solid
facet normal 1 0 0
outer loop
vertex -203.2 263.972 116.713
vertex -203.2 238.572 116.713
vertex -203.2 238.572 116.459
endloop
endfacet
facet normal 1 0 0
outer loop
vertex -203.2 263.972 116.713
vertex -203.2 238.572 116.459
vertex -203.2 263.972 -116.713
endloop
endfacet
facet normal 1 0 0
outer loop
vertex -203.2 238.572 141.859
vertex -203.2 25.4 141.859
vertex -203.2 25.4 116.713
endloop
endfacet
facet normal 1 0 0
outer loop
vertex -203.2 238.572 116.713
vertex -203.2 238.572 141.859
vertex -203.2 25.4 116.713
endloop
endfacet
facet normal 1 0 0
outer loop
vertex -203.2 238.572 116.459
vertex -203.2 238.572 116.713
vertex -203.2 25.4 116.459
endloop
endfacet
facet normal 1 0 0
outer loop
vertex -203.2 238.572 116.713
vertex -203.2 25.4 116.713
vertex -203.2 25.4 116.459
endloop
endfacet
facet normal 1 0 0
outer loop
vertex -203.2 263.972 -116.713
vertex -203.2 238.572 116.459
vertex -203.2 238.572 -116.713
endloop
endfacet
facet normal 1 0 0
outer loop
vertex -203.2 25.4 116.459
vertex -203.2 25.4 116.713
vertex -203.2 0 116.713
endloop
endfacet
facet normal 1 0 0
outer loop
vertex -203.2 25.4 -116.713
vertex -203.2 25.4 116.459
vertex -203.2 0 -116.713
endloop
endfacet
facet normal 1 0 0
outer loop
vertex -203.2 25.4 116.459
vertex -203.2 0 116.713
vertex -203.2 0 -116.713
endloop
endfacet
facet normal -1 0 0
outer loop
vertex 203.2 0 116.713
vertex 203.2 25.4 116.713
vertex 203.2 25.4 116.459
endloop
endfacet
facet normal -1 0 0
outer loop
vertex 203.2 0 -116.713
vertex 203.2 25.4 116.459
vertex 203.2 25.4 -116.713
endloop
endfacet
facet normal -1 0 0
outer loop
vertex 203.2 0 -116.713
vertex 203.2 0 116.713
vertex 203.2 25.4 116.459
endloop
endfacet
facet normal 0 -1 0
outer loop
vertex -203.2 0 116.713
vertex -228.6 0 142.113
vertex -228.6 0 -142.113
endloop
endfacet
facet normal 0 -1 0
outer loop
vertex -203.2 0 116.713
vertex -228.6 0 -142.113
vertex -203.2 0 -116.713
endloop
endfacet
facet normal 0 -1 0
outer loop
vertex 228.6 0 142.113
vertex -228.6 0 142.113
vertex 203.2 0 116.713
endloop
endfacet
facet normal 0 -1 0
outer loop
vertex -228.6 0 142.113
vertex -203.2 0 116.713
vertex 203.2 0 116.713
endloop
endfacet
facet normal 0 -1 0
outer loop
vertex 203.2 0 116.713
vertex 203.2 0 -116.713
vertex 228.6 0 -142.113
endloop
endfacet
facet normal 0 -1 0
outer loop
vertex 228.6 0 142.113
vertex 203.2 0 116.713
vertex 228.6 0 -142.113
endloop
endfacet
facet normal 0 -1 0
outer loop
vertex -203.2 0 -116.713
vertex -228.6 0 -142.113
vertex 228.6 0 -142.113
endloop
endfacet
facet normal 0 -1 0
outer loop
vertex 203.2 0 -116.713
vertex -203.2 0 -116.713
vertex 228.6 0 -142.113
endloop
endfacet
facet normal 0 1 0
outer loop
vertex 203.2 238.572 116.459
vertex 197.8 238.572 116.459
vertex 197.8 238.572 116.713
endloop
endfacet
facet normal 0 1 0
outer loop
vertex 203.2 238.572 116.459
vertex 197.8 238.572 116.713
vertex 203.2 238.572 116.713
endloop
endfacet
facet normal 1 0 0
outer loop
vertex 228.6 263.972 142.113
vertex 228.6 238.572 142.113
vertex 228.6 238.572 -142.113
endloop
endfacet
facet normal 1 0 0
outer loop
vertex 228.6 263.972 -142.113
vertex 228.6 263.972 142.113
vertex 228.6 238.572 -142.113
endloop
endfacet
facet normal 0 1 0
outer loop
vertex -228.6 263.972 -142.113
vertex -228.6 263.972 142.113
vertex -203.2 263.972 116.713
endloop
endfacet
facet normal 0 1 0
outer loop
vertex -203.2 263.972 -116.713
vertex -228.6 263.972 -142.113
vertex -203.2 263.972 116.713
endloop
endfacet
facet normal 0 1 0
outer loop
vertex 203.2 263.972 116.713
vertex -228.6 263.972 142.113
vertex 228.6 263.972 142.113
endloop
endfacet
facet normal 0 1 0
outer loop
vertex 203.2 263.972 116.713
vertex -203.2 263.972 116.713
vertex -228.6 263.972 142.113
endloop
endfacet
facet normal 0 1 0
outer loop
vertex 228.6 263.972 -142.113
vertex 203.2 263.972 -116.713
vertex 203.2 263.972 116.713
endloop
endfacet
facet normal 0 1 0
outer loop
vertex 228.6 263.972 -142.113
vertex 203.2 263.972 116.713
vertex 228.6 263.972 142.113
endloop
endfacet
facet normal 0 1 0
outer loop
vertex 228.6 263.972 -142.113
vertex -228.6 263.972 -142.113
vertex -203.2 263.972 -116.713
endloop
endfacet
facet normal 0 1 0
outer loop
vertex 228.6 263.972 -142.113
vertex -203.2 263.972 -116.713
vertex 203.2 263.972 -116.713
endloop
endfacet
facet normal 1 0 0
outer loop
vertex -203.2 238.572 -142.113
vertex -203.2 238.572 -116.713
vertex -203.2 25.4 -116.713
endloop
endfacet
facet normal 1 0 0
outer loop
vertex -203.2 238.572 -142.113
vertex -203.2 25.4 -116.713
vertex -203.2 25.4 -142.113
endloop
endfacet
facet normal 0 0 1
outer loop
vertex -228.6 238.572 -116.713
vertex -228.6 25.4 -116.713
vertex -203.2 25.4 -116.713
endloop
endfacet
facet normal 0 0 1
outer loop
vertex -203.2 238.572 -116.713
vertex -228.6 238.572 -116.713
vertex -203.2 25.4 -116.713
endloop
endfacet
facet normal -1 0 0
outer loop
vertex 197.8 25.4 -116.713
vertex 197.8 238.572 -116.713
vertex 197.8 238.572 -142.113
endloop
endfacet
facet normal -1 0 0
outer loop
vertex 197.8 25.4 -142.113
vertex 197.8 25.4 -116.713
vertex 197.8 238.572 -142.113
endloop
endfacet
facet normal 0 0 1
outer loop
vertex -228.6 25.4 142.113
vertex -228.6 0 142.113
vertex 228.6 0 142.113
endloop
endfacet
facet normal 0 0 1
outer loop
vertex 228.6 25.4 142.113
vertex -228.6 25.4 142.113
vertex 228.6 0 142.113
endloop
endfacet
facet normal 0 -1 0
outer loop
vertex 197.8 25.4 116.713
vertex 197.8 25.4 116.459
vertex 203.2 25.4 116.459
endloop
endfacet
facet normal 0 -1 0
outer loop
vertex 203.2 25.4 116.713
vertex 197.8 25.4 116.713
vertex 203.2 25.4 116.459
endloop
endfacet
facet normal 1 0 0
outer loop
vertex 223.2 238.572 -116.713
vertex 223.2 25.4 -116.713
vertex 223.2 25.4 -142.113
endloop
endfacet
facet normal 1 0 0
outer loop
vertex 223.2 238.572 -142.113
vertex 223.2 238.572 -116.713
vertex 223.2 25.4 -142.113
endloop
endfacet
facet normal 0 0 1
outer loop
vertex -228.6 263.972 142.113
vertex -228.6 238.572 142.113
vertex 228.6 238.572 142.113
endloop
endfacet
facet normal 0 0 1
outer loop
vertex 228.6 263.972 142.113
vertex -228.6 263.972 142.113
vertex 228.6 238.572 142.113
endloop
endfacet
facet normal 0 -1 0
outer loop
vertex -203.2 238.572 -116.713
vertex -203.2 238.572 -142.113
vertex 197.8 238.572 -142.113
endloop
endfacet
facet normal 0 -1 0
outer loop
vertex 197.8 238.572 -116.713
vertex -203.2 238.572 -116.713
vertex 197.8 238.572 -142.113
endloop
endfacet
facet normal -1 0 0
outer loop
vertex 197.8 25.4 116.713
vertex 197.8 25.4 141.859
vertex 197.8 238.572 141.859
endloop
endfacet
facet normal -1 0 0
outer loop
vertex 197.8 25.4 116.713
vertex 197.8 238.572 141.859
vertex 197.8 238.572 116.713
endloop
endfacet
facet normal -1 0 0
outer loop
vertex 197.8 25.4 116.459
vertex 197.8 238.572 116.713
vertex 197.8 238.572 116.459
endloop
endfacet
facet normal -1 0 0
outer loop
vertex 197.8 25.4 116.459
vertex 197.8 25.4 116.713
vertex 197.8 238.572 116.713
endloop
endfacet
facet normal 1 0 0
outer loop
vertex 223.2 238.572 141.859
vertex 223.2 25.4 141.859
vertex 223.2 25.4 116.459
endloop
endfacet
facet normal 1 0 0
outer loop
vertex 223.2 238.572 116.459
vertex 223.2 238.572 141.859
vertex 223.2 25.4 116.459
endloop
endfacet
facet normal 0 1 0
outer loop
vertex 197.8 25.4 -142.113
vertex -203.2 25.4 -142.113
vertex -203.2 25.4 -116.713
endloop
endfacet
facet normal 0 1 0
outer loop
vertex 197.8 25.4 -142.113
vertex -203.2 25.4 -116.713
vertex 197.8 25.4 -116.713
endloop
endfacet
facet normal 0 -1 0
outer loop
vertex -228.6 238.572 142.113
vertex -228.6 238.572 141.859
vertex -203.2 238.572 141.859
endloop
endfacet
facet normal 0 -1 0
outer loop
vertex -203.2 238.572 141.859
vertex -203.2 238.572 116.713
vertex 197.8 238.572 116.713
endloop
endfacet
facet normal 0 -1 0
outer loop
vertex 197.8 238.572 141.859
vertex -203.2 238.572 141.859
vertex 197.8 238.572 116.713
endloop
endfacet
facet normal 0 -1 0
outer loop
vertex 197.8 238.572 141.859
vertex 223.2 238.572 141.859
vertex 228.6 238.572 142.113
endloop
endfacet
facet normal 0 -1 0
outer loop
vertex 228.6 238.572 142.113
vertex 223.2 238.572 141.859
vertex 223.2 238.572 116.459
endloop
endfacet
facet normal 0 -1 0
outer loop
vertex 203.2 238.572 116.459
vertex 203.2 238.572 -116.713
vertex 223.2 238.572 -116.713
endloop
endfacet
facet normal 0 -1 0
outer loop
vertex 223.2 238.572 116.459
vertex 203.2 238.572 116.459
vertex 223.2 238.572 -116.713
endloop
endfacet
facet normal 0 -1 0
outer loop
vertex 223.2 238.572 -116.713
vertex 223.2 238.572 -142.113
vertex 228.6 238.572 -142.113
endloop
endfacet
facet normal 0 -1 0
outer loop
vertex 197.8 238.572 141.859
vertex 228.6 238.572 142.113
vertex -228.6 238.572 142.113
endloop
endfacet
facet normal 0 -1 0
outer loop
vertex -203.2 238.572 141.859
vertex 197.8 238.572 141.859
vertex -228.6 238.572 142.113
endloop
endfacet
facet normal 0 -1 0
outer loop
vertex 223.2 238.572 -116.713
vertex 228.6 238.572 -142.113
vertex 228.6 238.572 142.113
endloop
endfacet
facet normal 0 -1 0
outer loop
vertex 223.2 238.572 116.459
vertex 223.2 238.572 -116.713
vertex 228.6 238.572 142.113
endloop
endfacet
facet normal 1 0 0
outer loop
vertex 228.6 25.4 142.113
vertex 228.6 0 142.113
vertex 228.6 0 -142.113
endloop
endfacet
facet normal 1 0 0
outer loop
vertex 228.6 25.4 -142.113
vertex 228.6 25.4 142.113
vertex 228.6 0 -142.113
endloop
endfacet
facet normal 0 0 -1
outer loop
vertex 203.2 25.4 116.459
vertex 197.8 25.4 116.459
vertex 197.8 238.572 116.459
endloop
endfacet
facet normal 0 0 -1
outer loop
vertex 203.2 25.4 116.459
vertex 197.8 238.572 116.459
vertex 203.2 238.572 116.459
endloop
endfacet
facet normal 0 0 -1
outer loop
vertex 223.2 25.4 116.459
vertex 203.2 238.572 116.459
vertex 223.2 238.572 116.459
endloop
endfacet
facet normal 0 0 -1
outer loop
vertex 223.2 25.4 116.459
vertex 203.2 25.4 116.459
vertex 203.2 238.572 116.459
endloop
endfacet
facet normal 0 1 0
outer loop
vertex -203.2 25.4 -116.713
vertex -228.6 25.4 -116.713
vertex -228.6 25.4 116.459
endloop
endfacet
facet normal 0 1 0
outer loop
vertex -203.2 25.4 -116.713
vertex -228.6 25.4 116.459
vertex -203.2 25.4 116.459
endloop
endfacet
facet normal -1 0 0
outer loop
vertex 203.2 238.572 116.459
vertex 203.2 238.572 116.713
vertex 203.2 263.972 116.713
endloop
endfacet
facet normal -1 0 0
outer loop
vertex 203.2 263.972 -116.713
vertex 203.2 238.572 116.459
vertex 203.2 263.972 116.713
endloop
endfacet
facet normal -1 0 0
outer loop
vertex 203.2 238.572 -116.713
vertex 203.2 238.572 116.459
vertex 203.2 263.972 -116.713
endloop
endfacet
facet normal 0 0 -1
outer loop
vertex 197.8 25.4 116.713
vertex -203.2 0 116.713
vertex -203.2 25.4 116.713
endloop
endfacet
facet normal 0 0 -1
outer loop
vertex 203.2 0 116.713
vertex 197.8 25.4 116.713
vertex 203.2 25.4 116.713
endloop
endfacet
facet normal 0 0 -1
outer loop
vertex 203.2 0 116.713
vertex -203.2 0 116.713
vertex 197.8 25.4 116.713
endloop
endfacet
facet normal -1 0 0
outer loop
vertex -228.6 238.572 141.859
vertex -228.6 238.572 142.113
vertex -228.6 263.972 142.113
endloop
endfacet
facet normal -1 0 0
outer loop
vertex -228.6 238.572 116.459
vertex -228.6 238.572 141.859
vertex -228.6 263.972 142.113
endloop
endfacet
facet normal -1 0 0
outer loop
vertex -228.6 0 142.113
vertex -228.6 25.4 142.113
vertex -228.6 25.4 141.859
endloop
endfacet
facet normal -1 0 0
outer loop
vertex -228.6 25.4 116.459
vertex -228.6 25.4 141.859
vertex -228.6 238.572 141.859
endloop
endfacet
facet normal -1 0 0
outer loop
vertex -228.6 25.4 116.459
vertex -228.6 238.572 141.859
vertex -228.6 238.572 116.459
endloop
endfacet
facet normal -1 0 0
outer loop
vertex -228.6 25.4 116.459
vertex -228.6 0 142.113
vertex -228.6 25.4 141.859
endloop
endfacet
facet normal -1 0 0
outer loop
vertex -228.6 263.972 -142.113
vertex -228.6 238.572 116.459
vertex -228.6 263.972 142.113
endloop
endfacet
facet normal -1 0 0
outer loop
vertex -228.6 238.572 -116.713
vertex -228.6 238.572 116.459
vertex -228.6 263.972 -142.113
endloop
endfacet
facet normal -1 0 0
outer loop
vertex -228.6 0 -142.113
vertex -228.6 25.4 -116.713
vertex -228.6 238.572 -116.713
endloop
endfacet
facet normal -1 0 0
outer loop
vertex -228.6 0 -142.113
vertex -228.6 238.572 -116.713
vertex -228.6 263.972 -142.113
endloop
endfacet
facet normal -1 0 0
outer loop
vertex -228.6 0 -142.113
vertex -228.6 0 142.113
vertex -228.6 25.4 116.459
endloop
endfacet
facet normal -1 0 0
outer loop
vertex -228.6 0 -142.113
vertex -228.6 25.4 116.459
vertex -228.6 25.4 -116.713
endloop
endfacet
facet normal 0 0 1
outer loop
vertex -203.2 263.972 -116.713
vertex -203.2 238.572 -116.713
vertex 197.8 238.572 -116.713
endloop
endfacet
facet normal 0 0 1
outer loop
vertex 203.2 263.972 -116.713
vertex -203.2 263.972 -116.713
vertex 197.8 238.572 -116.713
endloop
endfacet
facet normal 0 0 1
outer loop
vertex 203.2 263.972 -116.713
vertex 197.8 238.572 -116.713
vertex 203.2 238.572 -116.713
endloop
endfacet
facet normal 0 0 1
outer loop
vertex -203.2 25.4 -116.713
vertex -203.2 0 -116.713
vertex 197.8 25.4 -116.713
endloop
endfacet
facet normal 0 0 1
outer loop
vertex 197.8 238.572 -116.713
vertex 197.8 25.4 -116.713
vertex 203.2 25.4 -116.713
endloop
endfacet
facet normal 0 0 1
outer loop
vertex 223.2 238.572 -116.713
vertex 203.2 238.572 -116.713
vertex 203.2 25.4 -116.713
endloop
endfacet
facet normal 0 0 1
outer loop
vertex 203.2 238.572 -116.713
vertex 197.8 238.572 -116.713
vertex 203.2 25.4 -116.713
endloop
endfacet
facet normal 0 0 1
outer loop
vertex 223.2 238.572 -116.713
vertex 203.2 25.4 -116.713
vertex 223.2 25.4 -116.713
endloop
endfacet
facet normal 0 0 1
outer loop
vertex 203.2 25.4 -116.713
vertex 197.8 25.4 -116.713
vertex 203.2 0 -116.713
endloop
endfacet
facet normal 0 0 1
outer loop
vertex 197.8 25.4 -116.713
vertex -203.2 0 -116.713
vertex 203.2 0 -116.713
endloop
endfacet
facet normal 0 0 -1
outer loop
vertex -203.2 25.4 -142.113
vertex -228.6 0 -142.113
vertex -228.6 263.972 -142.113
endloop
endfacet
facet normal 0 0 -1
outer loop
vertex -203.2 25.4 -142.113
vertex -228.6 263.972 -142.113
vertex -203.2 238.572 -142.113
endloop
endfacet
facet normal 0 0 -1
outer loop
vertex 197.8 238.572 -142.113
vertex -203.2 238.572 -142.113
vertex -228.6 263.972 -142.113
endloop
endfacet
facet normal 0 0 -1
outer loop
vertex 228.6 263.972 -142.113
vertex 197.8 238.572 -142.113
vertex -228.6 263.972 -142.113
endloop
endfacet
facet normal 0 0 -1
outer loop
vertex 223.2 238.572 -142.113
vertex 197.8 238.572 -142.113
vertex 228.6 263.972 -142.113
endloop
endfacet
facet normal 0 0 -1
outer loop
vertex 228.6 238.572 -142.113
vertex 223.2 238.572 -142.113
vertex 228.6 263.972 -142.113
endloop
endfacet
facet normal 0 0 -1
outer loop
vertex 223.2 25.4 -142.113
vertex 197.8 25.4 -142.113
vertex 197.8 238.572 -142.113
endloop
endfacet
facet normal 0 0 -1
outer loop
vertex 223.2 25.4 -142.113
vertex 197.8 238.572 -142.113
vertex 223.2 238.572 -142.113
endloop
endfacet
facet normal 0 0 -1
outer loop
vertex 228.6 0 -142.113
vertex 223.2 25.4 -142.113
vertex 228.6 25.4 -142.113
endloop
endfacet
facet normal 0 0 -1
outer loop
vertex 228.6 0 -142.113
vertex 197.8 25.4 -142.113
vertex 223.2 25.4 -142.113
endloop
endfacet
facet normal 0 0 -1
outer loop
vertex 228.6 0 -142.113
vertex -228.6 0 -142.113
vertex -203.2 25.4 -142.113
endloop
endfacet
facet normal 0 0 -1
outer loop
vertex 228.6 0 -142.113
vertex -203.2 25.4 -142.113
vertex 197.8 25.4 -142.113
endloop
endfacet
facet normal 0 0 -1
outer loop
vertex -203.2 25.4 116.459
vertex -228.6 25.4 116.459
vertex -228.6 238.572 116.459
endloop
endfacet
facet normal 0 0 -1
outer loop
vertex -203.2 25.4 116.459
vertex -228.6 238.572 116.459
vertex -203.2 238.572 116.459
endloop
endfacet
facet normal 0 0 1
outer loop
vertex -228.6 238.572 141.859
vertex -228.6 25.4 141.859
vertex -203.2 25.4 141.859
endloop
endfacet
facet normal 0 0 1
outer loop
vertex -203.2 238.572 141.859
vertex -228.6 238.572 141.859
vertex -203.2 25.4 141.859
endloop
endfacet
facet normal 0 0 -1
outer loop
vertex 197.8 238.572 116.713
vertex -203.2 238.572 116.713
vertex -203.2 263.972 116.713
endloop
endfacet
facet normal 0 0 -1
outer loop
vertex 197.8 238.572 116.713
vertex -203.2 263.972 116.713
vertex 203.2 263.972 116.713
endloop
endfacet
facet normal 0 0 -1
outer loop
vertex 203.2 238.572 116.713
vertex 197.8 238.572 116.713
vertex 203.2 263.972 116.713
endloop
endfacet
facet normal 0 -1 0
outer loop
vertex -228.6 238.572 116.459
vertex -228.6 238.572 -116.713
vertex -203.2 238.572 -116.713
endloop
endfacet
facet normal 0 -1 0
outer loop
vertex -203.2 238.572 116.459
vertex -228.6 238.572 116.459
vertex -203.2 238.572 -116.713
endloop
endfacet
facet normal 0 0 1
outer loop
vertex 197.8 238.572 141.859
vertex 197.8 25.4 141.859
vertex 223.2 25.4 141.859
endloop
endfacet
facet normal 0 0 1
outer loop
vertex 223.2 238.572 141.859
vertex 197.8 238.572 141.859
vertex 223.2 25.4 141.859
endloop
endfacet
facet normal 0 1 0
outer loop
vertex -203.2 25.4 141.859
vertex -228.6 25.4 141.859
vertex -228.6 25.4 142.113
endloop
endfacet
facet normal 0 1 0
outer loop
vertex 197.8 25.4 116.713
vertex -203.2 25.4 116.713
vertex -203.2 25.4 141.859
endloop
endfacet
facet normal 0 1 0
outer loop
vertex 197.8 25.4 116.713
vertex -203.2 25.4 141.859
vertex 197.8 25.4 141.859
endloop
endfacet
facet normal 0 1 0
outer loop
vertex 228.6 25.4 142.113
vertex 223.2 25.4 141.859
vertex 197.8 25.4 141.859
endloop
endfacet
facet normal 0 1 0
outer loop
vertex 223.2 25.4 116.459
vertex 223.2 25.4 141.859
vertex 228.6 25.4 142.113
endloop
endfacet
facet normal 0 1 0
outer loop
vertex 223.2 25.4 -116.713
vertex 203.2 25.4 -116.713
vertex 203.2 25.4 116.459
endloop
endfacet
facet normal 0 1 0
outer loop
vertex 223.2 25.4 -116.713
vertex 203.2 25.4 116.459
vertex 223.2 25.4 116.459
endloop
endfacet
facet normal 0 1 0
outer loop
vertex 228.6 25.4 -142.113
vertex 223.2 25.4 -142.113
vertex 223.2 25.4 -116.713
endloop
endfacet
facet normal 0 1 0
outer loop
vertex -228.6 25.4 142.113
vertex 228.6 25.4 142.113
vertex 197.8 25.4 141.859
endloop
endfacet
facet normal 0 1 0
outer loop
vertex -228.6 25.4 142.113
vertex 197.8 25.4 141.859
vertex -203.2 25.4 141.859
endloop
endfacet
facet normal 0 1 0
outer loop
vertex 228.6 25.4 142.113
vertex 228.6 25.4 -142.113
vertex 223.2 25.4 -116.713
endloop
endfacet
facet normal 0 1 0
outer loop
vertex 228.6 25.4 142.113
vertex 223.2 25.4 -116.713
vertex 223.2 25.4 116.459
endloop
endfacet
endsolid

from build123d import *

# Parameters (mm, degrees)
SKETCH1_W            = 406.4
SKETCH1_H            = 233.426
SKETCH1_W_2          = 25.4
SKETCH1_H_2          = 25.4
BOSS_EXTRUDE1_DEPTH  = 25.4
LPATTERN2_COUNT      = 2
LPATTERN2_PITCH      = 238.572
SKETCH2_W            = 25.4
SKETCH2_H            = 25.4
BOSS_EXTRUDE2_DEPTH  = 213.172
LPATTERN4_COUNT      = 2
LPATTERN4_PITCH      = 426.4
LPATTERN4_COUNT_DIR2 = 2
LPATTERN4_PITCH_DIR2 = 258.572


with BuildPart() as part:
    # Sketch1 → Boss-Extrude1 (new body)
    # profile 1 of 2: a face of its own
    with BuildSketch(Plane(origin=(0, 0, 0), x_dir=(1, 0, 0), z_dir=(0, 1, 0))):
        Polygon((-203.2, 142.113), (-203.2, 116.713), (-228.6, 116.713), (-228.6, -142.113), (228.6, -142.113), (228.6, 142.113), align=None)
        Rectangle(SKETCH1_W, SKETCH1_H, mode=Mode.SUBTRACT)
    # profile 2 of 2: a face of its own
    with BuildSketch(Plane(origin=(0, 0, 0), x_dir=(1, 0, 0), z_dir=(0, 1, 0))):
        with Locations((-215.9, 129.413)):
            Rectangle(SKETCH1_W_2, SKETCH1_H_2)
    extrude(amount=BOSS_EXTRUDE1_DEPTH)


with BuildPart() as lpattern2_1:
    # LPattern2: pattern copy
    add(part.part.moved(Location(Vector(0, 1, 0) * (1 * LPATTERN2_PITCH))))


with BuildPart() as part_1:
    add(part.part)

    add(lpattern2_1.part)  # Boss-Extrude2 merges LPattern2_1
    # Sketch2 → Boss-Extrude2 (add)
    with BuildSketch(Plane(origin=(0, 25.4, 0), x_dir=(1, 0, 0), z_dir=(0, 1, 0))):
        with Locations((-215.9, 129.413)):
            Rectangle(SKETCH2_W, SKETCH2_H)
    boss_extrude2 = extrude(amount=BOSS_EXTRUDE2_DEPTH)

    # LPattern4: Boss-Extrude2 2 × 2
    with Locations(*[(i * LPATTERN4_PITCH, 0, j * LPATTERN4_PITCH_DIR2) for i in range(LPATTERN4_COUNT) for j in range(LPATTERN4_COUNT_DIR2) if (i, j) != (0, 0)]):
        add(boss_extrude2)


solid = part_1.part
